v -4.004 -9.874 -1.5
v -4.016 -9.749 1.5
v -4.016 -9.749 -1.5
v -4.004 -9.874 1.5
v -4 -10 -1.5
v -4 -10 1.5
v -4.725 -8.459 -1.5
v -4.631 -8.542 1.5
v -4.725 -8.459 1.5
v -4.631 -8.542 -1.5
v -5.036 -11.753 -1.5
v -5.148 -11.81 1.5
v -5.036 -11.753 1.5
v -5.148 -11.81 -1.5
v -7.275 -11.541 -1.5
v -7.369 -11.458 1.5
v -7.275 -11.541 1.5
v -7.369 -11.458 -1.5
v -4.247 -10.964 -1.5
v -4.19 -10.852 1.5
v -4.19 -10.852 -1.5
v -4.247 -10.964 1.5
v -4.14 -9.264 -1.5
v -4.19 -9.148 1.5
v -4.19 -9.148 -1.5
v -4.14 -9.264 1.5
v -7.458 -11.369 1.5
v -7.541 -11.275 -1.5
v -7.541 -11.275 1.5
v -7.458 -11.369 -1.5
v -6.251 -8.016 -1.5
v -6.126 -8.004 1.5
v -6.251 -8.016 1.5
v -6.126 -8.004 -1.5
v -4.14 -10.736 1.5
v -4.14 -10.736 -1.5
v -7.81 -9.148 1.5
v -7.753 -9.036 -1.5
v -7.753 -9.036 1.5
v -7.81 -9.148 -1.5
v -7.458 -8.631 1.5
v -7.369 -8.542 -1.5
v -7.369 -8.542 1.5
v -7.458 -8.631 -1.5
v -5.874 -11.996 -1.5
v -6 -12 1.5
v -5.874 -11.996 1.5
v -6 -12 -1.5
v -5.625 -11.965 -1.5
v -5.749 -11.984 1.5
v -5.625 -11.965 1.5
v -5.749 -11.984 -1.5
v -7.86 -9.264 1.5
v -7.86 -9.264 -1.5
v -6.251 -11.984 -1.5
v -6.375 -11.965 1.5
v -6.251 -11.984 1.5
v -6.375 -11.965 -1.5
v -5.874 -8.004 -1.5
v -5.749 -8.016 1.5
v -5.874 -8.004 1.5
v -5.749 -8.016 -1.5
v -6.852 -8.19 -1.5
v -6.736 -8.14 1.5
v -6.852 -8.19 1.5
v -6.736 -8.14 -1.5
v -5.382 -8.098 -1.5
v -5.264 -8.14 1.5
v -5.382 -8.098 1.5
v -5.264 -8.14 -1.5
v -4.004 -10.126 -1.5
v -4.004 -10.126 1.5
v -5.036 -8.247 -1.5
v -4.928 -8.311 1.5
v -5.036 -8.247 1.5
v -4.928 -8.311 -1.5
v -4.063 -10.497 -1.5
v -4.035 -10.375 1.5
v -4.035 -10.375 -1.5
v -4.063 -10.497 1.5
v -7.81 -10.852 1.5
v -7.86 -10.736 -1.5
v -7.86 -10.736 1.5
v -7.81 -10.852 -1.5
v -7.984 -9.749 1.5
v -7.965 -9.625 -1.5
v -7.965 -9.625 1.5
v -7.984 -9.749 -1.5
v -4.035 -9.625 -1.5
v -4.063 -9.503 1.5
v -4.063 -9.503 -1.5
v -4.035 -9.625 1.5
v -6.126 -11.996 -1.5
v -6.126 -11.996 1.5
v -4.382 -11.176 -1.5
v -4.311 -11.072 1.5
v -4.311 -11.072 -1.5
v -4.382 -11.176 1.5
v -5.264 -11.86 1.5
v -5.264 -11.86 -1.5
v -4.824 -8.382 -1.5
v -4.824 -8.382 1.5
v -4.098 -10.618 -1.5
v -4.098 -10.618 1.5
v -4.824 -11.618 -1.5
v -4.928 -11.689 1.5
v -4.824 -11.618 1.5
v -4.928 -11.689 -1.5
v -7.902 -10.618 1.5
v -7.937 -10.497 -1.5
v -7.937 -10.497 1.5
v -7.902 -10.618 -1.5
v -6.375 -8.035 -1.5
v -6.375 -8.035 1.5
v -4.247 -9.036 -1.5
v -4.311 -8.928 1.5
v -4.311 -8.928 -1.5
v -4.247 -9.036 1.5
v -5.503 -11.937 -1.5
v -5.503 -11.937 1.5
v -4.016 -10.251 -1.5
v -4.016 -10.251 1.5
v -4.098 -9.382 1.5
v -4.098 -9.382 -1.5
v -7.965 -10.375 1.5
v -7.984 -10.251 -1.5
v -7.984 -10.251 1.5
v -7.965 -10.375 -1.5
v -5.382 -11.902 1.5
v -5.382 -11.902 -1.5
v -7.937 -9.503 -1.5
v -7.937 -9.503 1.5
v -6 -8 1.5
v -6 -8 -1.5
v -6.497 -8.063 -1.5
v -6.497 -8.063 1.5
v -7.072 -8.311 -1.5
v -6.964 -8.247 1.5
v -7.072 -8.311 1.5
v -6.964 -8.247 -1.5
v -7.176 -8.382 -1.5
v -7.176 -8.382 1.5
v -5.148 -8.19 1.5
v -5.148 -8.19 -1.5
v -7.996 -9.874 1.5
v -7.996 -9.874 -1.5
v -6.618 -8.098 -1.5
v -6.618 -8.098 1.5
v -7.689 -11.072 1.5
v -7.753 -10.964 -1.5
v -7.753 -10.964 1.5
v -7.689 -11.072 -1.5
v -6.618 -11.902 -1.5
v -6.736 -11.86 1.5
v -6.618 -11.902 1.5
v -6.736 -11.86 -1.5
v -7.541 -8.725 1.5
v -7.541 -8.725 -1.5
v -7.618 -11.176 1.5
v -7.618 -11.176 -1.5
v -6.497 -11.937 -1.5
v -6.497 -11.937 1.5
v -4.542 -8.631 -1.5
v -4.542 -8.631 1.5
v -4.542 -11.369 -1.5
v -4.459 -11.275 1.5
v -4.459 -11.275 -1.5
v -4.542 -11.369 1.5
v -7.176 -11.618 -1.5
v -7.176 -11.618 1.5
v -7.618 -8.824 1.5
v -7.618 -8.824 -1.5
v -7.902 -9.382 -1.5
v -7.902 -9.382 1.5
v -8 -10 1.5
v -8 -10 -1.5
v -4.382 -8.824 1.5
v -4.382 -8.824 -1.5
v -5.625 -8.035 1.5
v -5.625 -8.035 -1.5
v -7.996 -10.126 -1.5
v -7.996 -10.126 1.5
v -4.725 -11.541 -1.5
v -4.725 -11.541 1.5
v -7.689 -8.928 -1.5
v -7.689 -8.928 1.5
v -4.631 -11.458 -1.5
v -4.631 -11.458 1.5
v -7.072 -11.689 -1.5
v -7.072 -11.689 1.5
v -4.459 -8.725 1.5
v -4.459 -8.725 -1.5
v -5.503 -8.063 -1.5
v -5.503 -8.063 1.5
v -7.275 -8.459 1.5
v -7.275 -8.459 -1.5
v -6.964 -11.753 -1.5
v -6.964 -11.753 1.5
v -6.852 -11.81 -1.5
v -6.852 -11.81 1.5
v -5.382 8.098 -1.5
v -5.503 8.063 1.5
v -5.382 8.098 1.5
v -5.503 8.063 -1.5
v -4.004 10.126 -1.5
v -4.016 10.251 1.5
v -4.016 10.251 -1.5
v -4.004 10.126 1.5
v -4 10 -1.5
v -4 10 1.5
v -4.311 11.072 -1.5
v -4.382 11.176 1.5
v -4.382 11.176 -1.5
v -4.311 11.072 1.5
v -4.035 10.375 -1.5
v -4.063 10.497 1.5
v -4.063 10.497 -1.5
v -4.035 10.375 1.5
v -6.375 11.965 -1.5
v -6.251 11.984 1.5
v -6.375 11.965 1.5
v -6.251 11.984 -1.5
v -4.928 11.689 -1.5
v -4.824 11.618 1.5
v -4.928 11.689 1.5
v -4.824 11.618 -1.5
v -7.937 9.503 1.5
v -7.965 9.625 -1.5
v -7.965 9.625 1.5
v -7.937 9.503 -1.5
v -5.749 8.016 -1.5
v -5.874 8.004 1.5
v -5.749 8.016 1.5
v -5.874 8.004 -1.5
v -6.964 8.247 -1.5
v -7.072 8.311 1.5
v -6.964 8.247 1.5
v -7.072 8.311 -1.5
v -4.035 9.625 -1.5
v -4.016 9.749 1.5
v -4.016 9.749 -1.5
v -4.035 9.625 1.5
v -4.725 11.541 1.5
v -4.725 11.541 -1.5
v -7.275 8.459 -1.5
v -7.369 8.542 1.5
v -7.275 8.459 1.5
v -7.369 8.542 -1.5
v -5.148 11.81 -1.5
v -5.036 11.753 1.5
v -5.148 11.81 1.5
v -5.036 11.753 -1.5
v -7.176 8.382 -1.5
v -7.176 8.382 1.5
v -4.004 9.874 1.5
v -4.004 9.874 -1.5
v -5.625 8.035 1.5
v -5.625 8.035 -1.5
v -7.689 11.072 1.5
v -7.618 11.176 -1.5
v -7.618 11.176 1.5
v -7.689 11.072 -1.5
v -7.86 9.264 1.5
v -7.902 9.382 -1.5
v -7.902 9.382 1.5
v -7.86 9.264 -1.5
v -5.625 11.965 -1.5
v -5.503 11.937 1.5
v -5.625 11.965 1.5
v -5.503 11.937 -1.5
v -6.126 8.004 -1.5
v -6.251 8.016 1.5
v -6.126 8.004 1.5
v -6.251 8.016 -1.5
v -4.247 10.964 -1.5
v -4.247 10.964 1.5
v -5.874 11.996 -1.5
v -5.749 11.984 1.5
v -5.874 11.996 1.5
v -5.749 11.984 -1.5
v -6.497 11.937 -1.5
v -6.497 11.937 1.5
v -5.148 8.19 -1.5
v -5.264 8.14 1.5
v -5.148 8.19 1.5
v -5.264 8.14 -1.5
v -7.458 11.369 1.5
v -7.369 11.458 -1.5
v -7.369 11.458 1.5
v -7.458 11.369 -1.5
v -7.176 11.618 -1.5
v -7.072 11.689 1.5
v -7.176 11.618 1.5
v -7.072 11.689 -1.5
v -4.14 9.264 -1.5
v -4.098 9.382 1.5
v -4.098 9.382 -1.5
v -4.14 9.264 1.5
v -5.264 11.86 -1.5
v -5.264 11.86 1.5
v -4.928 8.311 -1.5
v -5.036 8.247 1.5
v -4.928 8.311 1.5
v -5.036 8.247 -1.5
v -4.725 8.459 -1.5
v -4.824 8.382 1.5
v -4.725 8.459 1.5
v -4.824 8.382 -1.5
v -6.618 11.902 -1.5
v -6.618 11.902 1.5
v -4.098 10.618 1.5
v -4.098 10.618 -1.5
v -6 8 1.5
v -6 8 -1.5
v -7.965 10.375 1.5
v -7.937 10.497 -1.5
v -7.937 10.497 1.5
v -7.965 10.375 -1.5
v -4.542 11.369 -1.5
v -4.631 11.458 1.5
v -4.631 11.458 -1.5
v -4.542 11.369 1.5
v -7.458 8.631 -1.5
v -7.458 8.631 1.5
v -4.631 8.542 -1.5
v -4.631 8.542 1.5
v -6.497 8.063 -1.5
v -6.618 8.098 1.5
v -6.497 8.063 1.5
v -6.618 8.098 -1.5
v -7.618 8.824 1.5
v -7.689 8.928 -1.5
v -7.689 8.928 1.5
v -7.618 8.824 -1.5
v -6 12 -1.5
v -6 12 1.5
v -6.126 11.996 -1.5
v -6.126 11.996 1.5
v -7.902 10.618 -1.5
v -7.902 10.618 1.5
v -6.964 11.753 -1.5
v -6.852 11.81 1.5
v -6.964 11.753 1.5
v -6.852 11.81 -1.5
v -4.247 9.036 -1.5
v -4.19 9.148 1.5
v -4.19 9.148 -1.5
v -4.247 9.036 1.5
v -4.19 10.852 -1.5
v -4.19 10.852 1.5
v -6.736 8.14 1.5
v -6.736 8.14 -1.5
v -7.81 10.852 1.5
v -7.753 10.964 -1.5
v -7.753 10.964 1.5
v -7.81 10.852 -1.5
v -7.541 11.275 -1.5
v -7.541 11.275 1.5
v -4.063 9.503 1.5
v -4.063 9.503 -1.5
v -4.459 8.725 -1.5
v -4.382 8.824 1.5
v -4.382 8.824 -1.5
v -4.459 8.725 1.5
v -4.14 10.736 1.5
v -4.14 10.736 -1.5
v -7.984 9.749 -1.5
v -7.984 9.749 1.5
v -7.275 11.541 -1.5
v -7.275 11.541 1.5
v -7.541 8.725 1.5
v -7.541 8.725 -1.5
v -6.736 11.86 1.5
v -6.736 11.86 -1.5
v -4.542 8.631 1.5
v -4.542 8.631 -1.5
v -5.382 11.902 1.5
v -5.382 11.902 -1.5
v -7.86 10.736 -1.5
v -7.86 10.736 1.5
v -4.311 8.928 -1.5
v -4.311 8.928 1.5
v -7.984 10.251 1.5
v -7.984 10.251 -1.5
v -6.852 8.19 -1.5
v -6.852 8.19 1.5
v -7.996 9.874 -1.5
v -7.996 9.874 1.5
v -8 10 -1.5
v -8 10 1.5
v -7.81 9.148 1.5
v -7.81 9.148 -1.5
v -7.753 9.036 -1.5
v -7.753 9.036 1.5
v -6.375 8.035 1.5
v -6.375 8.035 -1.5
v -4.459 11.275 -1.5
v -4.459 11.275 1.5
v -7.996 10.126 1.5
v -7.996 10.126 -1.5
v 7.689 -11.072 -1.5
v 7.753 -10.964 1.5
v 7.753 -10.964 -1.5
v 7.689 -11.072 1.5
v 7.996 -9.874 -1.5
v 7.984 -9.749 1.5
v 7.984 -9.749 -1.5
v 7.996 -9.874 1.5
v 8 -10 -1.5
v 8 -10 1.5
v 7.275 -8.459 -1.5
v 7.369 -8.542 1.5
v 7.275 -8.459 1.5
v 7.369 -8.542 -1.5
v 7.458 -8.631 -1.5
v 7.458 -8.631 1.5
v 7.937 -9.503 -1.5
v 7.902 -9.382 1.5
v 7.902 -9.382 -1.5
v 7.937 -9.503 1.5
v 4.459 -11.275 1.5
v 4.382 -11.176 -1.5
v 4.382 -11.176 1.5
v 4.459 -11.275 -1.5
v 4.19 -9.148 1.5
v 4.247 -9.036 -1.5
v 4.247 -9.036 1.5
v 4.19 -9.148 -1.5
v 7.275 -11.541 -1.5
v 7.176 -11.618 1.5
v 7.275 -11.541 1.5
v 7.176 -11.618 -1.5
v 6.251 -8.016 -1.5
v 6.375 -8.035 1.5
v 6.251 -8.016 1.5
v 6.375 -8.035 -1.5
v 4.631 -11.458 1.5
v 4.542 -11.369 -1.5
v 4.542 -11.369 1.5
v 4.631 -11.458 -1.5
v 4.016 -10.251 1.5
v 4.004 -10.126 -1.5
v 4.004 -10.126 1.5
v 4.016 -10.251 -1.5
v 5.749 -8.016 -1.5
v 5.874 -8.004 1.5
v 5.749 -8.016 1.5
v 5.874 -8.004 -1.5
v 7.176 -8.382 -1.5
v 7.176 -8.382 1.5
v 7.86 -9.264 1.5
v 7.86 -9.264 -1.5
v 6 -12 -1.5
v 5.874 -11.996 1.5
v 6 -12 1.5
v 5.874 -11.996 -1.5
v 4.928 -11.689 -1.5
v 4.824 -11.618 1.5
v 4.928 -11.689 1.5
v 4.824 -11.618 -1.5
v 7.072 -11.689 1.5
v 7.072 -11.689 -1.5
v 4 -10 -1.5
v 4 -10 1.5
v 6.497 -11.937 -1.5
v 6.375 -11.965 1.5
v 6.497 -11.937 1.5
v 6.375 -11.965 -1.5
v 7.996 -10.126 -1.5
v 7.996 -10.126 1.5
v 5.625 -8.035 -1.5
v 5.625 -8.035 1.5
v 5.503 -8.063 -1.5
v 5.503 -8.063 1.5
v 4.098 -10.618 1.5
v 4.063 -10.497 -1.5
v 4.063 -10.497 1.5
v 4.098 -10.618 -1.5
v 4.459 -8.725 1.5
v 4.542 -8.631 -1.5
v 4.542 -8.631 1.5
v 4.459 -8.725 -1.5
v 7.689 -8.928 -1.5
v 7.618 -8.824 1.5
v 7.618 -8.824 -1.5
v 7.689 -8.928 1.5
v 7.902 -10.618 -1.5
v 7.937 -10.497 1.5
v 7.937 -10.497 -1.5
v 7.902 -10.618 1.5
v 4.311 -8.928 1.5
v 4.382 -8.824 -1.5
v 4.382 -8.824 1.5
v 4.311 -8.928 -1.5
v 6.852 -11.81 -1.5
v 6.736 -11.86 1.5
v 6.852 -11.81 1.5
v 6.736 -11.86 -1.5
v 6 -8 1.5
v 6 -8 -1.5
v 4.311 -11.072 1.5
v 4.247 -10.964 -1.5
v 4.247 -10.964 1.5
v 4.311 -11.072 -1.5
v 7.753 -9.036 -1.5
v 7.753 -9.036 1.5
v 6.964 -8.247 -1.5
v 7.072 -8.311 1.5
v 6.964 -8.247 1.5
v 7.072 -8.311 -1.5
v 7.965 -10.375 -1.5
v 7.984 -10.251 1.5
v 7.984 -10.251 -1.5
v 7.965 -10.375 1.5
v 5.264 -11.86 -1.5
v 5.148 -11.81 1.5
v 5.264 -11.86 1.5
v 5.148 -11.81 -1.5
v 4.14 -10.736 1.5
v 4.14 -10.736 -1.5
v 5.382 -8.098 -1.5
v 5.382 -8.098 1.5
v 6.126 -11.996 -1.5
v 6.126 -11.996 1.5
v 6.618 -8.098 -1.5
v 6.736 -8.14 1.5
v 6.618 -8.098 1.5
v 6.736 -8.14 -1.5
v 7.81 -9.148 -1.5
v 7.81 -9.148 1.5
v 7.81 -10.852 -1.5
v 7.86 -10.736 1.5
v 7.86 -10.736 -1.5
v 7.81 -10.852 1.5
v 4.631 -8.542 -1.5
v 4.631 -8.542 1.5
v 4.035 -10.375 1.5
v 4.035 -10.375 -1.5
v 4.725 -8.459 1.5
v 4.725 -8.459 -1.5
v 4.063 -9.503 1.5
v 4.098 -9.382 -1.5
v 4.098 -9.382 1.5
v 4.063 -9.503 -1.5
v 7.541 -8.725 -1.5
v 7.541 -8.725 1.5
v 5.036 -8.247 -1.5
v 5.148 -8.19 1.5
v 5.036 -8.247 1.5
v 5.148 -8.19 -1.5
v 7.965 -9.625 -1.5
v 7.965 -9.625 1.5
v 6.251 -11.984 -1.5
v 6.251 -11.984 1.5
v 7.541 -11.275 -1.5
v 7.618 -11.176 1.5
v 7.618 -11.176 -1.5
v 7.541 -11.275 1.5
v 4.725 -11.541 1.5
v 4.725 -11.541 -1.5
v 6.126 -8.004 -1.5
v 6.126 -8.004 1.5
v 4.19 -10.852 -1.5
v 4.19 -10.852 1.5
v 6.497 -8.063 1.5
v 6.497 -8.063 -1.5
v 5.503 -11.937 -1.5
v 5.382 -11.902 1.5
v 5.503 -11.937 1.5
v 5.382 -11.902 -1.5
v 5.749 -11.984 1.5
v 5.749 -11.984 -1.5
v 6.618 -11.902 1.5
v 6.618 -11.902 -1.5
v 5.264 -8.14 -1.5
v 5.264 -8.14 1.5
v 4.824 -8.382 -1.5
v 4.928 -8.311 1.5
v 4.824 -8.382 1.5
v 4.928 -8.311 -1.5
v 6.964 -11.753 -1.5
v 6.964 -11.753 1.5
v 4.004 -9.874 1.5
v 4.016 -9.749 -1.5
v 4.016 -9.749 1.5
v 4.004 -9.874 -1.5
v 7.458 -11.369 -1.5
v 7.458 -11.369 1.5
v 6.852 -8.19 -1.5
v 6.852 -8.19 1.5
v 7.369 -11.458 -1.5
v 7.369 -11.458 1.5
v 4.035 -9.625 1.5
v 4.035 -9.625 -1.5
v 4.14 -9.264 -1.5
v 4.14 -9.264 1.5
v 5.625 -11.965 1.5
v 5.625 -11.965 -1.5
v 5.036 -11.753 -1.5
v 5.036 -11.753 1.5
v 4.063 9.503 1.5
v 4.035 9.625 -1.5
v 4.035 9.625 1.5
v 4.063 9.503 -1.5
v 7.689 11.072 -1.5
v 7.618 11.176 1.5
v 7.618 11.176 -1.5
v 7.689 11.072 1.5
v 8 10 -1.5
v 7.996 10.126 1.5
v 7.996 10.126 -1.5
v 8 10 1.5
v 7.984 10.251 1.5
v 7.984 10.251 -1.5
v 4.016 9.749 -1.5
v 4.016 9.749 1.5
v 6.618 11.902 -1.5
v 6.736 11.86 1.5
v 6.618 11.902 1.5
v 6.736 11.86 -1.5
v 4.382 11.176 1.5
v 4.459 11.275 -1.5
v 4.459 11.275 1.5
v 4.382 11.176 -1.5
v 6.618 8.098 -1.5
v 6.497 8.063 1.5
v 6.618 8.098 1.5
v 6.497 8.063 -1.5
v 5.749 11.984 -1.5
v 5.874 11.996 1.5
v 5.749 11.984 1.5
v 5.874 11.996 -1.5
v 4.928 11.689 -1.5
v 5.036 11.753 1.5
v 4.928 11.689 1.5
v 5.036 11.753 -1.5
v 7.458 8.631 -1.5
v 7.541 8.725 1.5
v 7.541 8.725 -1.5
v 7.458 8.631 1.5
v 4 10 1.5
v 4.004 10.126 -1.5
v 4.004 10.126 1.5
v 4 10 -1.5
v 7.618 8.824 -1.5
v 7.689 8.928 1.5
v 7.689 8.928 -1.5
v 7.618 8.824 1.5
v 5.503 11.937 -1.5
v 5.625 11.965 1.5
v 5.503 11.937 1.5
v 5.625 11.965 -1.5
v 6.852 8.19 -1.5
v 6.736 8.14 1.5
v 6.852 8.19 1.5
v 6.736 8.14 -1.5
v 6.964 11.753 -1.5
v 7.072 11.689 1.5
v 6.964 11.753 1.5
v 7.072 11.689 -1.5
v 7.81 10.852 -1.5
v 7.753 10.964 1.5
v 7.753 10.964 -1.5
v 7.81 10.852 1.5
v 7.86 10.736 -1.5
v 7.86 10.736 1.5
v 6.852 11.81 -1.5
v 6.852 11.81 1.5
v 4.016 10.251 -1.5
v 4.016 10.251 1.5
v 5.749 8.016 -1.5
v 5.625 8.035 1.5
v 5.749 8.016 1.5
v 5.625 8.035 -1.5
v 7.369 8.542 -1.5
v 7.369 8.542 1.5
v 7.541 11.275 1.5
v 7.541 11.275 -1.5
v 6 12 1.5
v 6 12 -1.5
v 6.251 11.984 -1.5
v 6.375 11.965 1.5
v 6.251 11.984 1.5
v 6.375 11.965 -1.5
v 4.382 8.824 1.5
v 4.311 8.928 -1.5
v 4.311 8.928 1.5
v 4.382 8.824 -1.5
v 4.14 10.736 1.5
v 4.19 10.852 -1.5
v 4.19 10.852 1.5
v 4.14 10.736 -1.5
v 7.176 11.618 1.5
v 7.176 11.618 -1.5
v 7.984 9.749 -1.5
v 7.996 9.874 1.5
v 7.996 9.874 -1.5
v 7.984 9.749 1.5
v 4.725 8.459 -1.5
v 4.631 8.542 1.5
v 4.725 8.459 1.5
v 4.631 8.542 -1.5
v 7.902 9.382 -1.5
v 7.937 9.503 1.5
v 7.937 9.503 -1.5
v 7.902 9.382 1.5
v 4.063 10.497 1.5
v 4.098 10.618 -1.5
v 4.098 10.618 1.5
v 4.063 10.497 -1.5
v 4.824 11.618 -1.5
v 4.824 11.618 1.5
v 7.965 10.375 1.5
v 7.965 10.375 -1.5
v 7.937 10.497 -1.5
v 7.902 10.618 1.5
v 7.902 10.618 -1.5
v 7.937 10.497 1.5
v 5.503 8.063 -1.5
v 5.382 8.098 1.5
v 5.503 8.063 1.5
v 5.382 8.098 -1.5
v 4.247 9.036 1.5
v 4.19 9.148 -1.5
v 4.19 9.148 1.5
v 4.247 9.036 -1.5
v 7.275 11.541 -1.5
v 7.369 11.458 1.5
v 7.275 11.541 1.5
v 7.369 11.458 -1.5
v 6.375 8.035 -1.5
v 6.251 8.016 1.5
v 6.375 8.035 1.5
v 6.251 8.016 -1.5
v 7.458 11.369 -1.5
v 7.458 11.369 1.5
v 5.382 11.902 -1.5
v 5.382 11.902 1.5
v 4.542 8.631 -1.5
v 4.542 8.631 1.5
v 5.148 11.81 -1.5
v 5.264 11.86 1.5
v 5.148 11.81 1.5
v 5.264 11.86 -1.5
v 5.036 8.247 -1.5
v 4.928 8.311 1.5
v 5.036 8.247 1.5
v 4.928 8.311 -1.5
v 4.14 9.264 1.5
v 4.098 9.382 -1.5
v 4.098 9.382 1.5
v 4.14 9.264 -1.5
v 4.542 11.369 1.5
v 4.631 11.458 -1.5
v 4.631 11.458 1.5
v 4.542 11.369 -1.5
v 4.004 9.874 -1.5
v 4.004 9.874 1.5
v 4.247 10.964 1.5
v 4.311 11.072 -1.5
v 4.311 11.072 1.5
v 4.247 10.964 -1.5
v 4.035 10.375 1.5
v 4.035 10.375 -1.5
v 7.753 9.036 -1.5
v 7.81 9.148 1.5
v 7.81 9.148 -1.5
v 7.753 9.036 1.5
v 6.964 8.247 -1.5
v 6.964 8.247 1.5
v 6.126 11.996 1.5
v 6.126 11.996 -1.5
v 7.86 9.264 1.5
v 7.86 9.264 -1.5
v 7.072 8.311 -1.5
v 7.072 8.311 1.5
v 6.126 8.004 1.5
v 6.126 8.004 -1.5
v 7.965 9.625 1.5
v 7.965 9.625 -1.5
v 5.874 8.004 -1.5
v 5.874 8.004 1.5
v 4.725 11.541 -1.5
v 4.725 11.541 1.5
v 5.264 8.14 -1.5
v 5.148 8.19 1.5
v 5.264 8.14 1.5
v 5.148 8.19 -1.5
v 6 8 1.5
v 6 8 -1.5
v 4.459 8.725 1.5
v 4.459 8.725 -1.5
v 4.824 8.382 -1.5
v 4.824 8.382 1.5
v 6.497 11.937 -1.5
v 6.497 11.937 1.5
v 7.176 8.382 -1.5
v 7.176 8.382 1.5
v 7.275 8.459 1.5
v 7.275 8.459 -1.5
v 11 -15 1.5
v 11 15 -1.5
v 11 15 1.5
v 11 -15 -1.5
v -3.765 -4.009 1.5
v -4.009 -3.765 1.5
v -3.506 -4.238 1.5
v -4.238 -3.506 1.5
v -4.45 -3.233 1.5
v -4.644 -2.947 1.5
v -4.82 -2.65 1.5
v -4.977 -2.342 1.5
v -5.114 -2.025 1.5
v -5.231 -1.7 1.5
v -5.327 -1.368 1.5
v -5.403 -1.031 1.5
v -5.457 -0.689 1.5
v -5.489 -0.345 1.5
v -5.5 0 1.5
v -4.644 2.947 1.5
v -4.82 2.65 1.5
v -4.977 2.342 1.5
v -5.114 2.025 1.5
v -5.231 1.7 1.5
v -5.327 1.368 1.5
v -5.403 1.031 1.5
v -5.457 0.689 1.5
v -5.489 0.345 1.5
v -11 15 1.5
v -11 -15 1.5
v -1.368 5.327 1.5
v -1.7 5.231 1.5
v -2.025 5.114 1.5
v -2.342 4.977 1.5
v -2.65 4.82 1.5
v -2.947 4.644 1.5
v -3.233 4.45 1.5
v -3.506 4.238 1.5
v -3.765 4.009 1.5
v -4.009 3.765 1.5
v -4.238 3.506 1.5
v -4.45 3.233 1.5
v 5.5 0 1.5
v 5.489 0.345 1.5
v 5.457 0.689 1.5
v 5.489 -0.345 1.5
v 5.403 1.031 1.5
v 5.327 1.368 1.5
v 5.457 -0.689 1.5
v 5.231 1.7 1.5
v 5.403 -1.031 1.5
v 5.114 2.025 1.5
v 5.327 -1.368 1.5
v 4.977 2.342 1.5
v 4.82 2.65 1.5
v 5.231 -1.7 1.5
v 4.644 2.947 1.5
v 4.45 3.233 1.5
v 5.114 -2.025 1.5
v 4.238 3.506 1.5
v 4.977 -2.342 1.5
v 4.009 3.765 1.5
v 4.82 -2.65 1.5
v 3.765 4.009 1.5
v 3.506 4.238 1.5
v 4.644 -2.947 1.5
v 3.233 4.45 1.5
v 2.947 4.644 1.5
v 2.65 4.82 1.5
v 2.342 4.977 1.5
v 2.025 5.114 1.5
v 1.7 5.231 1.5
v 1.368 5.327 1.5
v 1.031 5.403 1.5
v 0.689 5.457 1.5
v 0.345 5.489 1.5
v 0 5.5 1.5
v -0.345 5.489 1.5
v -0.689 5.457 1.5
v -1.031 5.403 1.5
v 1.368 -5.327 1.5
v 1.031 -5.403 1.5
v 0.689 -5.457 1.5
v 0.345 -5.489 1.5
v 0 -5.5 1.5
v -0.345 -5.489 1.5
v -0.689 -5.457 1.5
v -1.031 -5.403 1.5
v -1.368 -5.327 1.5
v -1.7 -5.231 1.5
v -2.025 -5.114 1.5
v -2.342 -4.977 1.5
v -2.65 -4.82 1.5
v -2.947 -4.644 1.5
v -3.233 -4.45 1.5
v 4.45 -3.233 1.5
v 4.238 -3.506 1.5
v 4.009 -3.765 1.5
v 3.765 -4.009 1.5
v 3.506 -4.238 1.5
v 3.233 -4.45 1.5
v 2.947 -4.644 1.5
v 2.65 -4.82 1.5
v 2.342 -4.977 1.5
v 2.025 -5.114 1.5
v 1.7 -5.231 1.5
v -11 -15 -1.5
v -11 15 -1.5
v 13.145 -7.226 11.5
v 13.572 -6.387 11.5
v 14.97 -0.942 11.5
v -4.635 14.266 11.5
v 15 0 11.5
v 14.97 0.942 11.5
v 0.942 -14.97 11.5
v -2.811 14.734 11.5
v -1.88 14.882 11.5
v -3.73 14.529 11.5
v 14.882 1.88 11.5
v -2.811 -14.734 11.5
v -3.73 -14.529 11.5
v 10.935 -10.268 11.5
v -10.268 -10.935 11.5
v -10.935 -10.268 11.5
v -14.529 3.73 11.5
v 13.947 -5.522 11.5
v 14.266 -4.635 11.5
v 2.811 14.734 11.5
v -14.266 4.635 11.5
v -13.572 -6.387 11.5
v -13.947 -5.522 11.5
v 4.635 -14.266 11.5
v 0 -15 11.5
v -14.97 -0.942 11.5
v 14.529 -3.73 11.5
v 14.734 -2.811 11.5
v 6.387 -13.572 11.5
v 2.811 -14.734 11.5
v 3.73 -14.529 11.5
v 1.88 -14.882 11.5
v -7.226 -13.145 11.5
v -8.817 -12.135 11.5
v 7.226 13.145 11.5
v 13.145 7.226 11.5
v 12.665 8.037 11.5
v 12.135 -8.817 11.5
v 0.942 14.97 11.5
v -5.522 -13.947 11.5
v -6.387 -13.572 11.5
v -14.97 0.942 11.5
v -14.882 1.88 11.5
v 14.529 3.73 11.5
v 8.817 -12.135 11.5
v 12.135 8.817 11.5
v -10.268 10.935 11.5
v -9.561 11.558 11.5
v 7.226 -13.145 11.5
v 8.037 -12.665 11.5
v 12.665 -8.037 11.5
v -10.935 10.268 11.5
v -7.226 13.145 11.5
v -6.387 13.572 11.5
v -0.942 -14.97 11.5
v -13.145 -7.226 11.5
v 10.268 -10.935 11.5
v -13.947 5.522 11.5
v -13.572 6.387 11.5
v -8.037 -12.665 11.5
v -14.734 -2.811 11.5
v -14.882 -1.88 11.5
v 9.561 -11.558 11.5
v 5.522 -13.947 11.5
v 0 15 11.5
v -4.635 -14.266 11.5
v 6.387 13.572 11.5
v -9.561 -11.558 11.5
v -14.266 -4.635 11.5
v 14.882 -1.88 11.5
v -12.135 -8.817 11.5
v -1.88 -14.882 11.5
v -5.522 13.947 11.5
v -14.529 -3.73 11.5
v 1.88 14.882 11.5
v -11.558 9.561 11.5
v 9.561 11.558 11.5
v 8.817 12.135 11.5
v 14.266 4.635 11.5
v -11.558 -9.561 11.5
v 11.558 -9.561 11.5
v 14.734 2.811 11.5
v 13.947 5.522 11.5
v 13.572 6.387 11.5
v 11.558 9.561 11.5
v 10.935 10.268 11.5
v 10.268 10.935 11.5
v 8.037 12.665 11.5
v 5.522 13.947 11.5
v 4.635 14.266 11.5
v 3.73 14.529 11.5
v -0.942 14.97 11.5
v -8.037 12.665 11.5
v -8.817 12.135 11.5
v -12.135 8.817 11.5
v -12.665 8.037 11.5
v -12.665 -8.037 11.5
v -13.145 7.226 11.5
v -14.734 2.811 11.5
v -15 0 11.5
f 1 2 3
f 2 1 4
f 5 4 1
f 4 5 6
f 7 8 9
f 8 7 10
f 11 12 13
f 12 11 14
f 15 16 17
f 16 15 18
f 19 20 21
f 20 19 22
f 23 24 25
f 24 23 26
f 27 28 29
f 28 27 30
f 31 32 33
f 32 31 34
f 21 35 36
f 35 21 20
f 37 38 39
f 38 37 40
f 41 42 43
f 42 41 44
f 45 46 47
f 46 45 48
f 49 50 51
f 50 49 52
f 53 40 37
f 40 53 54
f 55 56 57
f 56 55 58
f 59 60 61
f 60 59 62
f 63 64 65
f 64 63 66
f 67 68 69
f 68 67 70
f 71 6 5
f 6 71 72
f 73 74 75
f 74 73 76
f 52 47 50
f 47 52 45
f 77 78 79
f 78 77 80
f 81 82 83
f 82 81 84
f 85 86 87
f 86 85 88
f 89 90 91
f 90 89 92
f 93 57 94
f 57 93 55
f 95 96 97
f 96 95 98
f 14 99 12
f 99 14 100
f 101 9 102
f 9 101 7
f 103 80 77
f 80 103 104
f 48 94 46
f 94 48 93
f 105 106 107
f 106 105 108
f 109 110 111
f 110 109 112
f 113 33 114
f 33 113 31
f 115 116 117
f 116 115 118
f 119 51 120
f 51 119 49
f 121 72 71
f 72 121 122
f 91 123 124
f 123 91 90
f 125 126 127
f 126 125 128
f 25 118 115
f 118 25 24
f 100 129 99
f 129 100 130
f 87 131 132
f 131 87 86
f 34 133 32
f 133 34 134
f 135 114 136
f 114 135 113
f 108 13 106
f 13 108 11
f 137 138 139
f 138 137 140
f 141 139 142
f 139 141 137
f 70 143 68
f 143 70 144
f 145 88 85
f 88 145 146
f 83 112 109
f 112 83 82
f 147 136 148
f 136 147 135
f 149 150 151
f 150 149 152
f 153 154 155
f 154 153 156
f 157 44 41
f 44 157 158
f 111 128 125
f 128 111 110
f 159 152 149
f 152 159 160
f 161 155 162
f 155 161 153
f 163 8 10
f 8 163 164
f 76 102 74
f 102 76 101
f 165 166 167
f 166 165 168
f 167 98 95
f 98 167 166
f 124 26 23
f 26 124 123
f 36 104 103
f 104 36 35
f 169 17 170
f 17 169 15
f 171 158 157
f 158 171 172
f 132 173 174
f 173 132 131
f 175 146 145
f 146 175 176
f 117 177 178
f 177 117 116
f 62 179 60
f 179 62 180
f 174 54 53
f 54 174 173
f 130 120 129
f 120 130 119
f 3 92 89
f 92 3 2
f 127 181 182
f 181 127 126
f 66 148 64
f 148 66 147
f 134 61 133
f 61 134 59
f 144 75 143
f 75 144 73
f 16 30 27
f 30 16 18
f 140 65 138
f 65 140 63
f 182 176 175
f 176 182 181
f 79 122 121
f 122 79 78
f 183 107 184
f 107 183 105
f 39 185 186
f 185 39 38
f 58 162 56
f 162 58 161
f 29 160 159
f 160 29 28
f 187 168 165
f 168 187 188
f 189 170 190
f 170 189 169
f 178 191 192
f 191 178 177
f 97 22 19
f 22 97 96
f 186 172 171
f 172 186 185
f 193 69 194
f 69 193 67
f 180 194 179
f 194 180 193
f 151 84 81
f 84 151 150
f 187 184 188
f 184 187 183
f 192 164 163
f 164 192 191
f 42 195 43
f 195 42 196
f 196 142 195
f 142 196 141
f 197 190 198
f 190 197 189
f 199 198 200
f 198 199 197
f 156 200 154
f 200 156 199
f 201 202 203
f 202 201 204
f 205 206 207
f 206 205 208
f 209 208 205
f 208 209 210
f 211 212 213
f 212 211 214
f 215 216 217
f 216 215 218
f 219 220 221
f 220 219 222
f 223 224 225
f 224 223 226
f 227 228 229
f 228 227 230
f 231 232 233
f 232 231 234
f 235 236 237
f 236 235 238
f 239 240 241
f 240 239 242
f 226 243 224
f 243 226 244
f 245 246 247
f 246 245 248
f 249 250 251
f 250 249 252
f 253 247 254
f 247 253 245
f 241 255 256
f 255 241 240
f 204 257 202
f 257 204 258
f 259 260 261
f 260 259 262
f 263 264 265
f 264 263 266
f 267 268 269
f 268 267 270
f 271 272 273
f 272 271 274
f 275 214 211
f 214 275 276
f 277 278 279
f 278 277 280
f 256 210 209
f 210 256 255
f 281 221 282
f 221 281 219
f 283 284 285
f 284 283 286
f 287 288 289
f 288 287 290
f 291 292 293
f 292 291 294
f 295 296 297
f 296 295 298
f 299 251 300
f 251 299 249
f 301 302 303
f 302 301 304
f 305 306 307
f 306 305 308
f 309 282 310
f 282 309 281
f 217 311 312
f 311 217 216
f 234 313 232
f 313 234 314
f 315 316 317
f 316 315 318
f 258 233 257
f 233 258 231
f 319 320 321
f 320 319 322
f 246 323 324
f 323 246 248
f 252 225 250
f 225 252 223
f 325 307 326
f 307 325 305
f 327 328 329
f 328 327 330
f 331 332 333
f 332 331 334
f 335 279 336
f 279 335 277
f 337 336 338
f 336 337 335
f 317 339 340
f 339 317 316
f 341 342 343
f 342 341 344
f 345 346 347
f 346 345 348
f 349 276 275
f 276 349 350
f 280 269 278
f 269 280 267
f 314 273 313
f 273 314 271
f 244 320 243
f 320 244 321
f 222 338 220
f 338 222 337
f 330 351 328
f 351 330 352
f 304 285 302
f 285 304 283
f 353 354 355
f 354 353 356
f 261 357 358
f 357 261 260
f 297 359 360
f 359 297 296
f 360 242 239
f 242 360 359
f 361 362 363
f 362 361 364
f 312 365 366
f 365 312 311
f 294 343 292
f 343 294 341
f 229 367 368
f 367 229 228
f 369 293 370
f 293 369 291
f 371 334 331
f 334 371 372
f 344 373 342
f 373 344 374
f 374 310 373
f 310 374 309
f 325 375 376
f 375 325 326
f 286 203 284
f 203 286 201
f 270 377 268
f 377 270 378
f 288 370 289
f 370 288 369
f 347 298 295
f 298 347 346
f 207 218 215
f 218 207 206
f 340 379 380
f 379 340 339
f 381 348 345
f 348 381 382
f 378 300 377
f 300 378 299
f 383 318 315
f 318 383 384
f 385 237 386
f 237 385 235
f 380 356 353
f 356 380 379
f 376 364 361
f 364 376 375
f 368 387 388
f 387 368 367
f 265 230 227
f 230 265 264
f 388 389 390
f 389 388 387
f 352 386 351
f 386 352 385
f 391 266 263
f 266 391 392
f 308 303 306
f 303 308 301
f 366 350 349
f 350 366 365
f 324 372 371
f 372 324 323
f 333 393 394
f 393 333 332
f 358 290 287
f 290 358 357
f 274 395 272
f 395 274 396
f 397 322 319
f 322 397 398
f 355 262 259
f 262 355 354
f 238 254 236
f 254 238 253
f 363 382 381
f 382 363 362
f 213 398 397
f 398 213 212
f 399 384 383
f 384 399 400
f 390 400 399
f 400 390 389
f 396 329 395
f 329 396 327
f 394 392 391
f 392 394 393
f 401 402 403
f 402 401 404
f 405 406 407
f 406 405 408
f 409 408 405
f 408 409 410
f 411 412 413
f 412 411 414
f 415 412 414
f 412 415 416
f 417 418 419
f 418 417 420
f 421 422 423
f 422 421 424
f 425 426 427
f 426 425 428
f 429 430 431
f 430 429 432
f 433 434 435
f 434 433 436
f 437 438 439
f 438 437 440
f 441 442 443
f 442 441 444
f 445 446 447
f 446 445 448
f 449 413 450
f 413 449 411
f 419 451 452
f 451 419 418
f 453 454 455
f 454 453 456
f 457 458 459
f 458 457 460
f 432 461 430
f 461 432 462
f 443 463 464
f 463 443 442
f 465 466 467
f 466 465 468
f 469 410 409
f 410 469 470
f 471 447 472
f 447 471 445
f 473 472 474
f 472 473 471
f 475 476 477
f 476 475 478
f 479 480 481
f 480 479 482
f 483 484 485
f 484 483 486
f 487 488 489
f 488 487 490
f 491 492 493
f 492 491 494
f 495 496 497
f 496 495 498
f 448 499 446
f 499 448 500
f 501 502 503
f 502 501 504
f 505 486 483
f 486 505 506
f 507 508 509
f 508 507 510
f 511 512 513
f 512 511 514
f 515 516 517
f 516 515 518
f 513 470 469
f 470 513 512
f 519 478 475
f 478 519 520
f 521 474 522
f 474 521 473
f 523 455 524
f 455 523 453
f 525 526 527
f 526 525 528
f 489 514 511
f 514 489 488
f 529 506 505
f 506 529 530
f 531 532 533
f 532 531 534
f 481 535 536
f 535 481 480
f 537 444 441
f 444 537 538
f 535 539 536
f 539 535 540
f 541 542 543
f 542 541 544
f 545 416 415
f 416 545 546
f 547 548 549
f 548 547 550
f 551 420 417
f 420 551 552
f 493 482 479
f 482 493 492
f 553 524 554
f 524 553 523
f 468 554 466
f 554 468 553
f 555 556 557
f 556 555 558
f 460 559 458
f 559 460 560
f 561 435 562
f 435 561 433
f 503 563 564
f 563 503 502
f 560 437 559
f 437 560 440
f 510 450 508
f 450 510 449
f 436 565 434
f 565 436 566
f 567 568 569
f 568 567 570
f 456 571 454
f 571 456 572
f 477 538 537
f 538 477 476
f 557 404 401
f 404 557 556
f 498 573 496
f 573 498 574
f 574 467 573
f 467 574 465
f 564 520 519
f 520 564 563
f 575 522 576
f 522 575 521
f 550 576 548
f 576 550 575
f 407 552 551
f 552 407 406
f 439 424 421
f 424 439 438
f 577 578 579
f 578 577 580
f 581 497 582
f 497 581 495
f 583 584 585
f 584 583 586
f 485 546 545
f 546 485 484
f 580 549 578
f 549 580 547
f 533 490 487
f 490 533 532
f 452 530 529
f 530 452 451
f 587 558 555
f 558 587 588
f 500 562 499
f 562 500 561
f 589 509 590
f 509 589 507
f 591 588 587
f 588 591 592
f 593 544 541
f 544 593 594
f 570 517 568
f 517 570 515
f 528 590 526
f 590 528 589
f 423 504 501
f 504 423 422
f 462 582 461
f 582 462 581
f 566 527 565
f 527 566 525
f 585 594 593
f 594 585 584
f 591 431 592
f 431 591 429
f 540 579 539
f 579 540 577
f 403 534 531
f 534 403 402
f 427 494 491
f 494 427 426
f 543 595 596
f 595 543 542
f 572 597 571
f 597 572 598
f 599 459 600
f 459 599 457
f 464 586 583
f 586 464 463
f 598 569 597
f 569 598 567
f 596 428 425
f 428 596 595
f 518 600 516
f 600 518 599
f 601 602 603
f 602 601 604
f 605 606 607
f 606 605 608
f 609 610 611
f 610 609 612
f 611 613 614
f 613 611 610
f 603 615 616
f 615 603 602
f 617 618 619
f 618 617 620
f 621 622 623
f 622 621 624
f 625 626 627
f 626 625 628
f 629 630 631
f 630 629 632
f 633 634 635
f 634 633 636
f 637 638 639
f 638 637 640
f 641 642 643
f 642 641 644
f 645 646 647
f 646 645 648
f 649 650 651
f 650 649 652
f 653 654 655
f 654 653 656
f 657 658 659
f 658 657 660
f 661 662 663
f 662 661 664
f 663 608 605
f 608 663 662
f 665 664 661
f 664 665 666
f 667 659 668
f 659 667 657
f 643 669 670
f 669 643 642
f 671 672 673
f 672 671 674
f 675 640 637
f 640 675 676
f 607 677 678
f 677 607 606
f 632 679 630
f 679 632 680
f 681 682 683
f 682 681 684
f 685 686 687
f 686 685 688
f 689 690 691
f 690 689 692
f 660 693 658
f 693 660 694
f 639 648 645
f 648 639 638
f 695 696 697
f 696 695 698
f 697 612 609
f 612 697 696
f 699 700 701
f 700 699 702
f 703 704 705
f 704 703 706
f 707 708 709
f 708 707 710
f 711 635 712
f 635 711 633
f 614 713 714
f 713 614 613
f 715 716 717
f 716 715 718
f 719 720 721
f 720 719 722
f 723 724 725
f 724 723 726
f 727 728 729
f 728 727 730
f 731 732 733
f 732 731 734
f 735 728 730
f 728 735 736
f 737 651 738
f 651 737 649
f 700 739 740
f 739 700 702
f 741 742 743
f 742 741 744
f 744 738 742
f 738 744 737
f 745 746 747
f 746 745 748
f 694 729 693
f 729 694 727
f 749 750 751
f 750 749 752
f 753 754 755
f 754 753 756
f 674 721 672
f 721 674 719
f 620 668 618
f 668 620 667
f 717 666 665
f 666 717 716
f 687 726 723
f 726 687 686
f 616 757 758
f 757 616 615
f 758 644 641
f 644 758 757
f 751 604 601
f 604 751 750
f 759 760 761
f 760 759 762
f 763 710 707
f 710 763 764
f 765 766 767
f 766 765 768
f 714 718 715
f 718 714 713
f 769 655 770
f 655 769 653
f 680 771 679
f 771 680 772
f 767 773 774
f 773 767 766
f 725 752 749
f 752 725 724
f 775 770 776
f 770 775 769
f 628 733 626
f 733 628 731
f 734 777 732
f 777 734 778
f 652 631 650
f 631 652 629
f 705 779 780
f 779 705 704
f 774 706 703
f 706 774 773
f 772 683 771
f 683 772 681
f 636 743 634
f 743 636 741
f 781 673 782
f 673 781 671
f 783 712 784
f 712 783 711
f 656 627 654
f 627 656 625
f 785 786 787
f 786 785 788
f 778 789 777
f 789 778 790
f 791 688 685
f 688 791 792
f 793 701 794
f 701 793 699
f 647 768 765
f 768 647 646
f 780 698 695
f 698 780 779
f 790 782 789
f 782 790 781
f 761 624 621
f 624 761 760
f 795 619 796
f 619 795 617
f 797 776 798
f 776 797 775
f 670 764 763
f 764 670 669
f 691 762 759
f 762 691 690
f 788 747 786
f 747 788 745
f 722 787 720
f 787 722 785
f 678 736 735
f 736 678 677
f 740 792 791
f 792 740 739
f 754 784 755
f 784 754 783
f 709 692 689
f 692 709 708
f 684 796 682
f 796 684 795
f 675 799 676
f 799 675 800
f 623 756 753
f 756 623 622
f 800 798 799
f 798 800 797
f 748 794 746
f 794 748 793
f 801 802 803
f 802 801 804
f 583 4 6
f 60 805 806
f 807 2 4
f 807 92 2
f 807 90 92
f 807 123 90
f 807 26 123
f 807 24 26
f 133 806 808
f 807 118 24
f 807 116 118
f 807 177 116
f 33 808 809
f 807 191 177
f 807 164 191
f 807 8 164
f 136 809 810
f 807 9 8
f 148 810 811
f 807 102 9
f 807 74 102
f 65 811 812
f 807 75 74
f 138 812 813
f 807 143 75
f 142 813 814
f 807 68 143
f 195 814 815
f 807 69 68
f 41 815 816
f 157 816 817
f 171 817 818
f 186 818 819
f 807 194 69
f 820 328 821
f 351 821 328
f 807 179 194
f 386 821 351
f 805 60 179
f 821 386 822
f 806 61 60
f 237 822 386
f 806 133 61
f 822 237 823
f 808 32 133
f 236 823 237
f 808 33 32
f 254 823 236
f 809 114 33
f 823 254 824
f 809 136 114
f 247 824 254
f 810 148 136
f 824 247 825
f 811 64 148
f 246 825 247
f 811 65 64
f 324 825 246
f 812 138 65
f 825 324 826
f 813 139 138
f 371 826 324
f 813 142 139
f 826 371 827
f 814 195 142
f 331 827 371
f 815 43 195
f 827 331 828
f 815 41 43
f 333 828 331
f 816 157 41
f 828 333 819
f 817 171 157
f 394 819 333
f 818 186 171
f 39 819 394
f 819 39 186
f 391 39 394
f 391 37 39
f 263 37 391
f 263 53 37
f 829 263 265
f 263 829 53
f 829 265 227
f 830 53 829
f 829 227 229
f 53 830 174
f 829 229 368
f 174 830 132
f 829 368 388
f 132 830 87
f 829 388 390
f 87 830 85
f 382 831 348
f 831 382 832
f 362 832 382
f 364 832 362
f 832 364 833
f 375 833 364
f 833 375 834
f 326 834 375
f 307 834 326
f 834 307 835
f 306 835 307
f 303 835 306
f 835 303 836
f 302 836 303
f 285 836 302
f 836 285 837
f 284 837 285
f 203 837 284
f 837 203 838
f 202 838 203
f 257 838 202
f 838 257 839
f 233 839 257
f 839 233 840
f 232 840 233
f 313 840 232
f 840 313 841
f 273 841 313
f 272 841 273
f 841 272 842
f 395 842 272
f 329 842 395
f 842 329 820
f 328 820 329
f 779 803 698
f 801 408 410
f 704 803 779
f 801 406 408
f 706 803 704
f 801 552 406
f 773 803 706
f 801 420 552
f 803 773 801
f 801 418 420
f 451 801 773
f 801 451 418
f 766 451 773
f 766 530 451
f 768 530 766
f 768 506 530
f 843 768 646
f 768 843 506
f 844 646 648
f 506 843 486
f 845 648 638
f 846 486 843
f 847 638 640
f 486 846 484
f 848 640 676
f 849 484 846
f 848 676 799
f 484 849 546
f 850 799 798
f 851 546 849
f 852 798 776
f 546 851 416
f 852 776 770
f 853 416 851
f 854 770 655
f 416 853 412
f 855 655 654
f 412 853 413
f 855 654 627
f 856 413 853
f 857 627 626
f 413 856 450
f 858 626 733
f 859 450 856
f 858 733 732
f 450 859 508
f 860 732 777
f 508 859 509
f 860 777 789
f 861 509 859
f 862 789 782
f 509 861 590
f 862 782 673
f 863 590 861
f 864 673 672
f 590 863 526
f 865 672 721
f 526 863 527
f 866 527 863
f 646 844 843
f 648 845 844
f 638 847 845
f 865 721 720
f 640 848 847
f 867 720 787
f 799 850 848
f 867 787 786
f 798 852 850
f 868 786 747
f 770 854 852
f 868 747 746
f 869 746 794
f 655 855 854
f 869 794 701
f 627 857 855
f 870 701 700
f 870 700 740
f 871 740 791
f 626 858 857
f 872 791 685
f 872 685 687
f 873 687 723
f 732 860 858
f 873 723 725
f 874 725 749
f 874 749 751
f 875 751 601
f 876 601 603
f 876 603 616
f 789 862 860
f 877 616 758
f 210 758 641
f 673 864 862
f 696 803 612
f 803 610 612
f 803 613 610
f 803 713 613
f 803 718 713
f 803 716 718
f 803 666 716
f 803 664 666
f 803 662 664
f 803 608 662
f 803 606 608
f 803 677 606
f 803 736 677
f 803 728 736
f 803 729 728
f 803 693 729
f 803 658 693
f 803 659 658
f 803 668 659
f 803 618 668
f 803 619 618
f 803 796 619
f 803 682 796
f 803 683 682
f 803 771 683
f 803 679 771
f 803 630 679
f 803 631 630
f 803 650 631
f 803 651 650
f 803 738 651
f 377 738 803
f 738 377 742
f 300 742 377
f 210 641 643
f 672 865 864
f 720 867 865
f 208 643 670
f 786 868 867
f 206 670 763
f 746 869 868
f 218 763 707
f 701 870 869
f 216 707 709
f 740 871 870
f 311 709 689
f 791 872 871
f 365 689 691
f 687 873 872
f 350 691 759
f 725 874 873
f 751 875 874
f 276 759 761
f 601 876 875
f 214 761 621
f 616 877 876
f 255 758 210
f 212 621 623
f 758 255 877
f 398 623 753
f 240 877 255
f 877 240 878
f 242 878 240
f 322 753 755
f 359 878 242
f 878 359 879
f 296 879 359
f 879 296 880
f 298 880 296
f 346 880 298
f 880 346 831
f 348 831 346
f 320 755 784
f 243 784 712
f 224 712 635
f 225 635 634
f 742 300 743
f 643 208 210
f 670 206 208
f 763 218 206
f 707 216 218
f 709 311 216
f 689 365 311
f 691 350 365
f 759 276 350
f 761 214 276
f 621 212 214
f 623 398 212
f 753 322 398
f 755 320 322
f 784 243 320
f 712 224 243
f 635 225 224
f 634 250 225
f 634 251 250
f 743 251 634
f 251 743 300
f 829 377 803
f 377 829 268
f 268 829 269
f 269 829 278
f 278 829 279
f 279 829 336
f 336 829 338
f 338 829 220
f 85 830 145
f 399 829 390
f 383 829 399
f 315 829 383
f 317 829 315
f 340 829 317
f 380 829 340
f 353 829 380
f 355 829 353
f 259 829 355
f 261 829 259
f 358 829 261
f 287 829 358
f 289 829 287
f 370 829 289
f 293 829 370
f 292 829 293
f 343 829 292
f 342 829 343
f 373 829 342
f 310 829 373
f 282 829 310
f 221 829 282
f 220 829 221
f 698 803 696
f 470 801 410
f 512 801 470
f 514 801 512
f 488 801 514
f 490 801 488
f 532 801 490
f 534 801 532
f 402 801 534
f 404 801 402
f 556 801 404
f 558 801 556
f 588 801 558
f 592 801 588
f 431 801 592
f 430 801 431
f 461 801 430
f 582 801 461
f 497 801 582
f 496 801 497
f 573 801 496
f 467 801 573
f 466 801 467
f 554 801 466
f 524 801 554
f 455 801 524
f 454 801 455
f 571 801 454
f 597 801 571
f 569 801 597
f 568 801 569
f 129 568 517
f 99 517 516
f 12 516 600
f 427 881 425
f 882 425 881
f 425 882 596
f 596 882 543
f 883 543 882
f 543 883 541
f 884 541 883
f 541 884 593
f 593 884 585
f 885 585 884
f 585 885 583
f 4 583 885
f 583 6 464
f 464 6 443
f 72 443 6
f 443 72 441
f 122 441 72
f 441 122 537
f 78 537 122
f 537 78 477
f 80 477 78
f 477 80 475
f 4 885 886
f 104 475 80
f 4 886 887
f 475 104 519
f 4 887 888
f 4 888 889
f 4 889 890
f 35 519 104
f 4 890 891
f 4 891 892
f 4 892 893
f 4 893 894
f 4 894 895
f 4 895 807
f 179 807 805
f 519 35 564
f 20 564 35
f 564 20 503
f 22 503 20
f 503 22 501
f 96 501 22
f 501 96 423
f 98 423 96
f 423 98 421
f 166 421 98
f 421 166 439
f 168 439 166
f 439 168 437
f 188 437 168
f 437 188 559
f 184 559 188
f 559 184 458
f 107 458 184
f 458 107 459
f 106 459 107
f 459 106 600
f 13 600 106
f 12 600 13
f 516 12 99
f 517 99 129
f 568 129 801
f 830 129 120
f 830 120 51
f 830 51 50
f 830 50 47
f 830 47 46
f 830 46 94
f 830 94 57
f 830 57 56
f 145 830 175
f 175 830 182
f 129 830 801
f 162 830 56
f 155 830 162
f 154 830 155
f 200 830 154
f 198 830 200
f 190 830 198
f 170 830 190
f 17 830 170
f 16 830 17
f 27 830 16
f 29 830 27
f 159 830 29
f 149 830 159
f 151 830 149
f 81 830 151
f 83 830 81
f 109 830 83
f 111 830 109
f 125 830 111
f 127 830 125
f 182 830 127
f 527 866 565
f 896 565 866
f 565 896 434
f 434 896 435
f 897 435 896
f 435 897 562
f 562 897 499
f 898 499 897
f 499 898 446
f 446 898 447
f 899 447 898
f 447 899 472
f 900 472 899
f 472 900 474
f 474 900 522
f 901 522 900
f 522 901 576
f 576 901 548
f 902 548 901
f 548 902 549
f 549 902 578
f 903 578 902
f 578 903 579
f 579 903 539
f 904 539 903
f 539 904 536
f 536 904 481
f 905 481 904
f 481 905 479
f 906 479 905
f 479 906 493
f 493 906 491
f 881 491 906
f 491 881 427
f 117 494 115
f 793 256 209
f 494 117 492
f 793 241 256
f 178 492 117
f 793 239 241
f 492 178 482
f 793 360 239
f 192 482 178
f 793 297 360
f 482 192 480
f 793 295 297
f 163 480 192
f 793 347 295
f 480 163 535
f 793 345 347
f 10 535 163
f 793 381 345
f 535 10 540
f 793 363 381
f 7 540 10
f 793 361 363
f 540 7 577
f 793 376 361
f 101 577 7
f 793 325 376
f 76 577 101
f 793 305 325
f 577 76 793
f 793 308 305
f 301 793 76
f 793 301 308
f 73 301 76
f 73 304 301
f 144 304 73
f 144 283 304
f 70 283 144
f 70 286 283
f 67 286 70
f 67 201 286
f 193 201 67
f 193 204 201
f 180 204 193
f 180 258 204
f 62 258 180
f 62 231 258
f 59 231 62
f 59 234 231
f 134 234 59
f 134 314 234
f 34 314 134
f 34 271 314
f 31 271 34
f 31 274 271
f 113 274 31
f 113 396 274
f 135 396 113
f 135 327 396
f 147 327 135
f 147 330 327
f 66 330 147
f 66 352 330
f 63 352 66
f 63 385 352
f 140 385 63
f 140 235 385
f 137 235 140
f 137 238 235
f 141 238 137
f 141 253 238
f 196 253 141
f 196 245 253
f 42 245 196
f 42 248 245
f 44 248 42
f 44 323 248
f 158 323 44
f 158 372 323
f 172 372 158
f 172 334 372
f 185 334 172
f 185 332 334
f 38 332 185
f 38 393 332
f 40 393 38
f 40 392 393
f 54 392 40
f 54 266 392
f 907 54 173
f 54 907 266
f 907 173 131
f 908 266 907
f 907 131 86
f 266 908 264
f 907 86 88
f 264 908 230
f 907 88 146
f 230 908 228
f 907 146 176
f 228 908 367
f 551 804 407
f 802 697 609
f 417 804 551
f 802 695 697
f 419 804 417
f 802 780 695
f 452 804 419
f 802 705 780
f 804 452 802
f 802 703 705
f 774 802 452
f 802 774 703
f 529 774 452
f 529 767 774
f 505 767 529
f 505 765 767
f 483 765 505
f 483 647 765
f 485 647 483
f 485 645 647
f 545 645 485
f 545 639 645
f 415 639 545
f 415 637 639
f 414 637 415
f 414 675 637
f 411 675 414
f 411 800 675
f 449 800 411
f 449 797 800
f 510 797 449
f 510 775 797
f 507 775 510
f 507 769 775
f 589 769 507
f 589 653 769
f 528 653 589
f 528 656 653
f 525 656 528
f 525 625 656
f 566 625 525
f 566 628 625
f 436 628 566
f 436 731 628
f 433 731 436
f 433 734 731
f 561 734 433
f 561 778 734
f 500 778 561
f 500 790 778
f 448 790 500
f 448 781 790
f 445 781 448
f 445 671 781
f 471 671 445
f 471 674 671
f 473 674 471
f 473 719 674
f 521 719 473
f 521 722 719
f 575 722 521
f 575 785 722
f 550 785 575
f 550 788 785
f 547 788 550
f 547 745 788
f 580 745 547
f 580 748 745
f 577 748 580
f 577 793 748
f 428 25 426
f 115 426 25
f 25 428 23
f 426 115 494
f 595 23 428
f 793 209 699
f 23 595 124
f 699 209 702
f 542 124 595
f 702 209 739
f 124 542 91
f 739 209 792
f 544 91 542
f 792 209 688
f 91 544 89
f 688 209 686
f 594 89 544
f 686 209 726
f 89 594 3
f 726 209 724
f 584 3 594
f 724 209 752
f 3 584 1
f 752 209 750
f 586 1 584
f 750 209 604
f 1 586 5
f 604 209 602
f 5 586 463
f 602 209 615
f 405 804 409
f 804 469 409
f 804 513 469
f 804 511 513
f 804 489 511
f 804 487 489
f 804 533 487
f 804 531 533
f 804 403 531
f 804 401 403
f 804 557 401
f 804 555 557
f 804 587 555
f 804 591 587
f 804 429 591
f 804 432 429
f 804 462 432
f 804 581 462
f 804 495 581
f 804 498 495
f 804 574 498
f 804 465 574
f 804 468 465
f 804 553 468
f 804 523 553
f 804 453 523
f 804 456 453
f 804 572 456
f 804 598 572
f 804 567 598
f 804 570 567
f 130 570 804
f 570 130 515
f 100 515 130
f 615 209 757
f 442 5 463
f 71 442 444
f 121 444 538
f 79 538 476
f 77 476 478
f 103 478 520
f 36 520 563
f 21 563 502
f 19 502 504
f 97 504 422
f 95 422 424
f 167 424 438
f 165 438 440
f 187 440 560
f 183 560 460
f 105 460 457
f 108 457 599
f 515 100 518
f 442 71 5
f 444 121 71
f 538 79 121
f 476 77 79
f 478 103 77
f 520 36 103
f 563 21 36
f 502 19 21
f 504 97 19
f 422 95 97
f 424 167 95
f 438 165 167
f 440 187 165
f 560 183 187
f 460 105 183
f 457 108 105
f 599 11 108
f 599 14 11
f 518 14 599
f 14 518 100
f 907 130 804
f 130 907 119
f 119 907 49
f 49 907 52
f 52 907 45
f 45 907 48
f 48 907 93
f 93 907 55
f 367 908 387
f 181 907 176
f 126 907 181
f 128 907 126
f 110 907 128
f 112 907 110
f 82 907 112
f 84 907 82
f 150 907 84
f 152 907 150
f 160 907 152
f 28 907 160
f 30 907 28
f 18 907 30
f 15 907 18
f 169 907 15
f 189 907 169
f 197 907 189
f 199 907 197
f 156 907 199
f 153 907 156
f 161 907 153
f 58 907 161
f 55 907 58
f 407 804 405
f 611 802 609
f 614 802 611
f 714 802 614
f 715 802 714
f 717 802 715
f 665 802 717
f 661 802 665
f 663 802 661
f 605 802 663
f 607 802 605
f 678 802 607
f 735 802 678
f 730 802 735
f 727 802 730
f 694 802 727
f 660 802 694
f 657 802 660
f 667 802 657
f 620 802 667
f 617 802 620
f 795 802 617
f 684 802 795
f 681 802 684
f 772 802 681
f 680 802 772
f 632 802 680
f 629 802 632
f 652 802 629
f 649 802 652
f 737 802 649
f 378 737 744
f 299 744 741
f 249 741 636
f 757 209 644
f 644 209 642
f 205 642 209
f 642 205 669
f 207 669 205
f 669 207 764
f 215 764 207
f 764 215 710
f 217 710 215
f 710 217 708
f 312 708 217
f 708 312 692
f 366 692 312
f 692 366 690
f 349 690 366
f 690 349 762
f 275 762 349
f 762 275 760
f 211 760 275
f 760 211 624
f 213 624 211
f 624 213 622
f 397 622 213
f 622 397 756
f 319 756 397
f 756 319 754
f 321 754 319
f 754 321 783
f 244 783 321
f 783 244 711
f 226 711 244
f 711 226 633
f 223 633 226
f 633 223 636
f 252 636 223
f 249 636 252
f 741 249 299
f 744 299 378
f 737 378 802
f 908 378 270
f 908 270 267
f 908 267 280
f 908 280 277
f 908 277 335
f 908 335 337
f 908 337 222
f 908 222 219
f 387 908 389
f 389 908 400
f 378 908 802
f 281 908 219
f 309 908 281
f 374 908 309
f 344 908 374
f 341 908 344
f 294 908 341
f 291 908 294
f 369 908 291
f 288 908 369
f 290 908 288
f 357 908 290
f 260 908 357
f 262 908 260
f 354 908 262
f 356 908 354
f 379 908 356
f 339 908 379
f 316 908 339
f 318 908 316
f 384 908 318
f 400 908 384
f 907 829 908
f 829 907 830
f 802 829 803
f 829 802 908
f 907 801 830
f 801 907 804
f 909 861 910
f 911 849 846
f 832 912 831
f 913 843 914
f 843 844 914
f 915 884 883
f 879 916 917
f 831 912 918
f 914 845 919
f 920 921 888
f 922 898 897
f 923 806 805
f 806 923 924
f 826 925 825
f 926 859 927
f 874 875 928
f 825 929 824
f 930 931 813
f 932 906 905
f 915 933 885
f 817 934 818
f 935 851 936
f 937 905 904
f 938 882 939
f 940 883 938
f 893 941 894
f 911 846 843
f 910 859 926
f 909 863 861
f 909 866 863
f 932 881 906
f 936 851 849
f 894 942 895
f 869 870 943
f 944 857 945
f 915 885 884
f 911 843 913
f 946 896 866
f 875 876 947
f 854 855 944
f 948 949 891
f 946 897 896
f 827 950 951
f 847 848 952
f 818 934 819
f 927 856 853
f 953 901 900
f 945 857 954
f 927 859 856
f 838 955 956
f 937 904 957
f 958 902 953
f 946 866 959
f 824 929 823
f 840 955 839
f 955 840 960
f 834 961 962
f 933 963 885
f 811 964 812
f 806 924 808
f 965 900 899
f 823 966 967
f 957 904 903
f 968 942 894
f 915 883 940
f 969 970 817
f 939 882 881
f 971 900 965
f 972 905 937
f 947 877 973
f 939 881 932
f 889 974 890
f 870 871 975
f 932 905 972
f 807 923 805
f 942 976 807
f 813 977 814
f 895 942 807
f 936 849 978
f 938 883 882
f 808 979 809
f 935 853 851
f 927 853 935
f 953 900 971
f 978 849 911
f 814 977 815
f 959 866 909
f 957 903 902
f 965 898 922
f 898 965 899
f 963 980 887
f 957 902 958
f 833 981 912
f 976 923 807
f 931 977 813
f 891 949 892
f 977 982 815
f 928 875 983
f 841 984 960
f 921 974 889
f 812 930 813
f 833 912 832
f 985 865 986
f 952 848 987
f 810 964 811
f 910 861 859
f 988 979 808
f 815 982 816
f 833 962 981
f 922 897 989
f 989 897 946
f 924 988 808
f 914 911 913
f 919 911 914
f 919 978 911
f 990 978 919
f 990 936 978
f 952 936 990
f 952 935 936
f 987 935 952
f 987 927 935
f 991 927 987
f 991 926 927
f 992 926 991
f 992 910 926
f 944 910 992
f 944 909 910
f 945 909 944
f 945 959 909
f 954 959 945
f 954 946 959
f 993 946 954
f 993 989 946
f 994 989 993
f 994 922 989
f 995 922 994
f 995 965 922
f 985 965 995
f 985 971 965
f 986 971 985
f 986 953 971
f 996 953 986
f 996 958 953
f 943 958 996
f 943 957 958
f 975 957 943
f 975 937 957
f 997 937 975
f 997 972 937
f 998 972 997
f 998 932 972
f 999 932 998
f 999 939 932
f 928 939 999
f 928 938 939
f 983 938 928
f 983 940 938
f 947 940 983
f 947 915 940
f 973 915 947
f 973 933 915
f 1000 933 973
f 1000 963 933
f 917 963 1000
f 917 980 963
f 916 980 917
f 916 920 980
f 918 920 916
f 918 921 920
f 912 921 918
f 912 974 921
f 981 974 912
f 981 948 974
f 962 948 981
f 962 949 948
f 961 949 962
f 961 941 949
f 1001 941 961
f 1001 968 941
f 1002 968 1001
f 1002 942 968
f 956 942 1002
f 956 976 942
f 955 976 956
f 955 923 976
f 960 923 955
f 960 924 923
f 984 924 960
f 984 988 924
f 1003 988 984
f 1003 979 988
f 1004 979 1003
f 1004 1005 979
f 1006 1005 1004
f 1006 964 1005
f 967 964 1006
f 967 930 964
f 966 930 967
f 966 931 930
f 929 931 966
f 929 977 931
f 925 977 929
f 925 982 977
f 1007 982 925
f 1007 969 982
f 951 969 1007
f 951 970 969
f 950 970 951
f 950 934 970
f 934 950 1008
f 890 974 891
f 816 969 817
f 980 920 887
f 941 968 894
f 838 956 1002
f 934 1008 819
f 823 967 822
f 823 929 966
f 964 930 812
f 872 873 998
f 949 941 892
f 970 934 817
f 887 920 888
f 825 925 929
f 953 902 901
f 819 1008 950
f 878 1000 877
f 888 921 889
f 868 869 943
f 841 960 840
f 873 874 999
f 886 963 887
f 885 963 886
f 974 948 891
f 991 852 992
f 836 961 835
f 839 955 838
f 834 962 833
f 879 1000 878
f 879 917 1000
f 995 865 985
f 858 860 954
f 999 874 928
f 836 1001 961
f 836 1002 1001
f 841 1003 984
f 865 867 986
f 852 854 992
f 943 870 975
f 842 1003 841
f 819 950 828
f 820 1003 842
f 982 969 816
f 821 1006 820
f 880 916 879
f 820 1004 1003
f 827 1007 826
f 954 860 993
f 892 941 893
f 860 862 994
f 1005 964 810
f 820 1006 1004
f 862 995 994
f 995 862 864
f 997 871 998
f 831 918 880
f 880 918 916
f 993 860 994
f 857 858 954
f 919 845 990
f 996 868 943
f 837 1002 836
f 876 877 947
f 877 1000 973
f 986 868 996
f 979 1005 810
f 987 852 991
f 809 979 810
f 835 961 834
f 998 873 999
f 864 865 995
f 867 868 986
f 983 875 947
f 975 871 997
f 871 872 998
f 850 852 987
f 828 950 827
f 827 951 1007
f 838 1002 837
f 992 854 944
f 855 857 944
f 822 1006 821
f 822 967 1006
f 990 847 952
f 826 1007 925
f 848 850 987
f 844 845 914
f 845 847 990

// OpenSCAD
/*
Customizable Center Bed Support, by ggroloff 9.10.2018

Use this to generate a center bed support model of any height which mounts between the y-carriage and bed, using the mount points of the y-belt holder.

You can then adjust the height at the four corners of the bed to raise or lower the center support relative to the corners.

Works well with a hard foam spacer to insulate the part from the heat if using a heated bed. Adjust height accordingly.

CAUTION: Using this will fix the center of your bed in place, so a head crash will be much worse. Use at your own risk.

Example values for my Anet A8 stock y carriage, using a 12.5 mm thick, 30 mm x 30 mm hard foam spacer.

** The foam covered a thermistor on my heat bed, however I didn't notice any heating issues after installing.
*/

//All units in mm

//sets total height of support
height=13;

//sets thickness of mount plate
mount_thickness=3;

//sets length of mount plate on x-axis
mount_plate_x = 22;

//sets length of mount plate on y-axis
mount_plate_y = 30;

//sets diameter of mount plate screws (oversize if you don't want to take your y belt off)
screw_diameter=4;

//sets distance between mount screw centers on x-axis
x_mount_distance = 12;

//sets distance between mount screw centers on y-axis
y_mount_distance = 20;

//sets support post base diameter (watch the overhang)
base_diameter = 11;

//sets support post top diameter
top_diameter = 30;





/*[Hidden]*/
//code starts here

//defines mount points
module mount_points() {
    translate ([-x_mount_distance/2,-y_mount_distance/2,0]) cylinder(d=screw_diameter, h=mount_thickness+.1, center=true, $fn=100);
    translate ([-x_mount_distance/2,y_mount_distance/2,0]) cylinder(d=screw_diameter, h=mount_thickness+.1, center=true, $fn=100);
    translate ([x_mount_distance/2,-y_mount_distance/2,0]) cylinder(d=screw_diameter, h=mount_thickness+.1, center=true, $fn=100);
    translate ([x_mount_distance/2,y_mount_distance/2,0]) cylinder(d=screw_diameter, h=mount_thickness+.1, center=true, $fn=100);
};
//mount_points();

//defines mount plate shape
module mount_plate() {
    cube ([mount_plate_x, mount_plate_y, mount_thickness], center=true);
};
//mount_plate();
 
//defines support pillar shape
module support_pillar() {
    translate([0,0, mount_thickness/2]) cylinder (r1=base_diameter/2, r2=top_diameter/2, h=height-mount_thickness, $fn=100);
};
//support_pillar();

//defines final center bed support shape
module center_bed_support() {
union(){
support_pillar(); //create support pillar
difference(){
    mount_plate(); //create mount plate
    mount_points(); //drill out mount holes
    };
};
};
center_bed_support(); //renders center bed support model
